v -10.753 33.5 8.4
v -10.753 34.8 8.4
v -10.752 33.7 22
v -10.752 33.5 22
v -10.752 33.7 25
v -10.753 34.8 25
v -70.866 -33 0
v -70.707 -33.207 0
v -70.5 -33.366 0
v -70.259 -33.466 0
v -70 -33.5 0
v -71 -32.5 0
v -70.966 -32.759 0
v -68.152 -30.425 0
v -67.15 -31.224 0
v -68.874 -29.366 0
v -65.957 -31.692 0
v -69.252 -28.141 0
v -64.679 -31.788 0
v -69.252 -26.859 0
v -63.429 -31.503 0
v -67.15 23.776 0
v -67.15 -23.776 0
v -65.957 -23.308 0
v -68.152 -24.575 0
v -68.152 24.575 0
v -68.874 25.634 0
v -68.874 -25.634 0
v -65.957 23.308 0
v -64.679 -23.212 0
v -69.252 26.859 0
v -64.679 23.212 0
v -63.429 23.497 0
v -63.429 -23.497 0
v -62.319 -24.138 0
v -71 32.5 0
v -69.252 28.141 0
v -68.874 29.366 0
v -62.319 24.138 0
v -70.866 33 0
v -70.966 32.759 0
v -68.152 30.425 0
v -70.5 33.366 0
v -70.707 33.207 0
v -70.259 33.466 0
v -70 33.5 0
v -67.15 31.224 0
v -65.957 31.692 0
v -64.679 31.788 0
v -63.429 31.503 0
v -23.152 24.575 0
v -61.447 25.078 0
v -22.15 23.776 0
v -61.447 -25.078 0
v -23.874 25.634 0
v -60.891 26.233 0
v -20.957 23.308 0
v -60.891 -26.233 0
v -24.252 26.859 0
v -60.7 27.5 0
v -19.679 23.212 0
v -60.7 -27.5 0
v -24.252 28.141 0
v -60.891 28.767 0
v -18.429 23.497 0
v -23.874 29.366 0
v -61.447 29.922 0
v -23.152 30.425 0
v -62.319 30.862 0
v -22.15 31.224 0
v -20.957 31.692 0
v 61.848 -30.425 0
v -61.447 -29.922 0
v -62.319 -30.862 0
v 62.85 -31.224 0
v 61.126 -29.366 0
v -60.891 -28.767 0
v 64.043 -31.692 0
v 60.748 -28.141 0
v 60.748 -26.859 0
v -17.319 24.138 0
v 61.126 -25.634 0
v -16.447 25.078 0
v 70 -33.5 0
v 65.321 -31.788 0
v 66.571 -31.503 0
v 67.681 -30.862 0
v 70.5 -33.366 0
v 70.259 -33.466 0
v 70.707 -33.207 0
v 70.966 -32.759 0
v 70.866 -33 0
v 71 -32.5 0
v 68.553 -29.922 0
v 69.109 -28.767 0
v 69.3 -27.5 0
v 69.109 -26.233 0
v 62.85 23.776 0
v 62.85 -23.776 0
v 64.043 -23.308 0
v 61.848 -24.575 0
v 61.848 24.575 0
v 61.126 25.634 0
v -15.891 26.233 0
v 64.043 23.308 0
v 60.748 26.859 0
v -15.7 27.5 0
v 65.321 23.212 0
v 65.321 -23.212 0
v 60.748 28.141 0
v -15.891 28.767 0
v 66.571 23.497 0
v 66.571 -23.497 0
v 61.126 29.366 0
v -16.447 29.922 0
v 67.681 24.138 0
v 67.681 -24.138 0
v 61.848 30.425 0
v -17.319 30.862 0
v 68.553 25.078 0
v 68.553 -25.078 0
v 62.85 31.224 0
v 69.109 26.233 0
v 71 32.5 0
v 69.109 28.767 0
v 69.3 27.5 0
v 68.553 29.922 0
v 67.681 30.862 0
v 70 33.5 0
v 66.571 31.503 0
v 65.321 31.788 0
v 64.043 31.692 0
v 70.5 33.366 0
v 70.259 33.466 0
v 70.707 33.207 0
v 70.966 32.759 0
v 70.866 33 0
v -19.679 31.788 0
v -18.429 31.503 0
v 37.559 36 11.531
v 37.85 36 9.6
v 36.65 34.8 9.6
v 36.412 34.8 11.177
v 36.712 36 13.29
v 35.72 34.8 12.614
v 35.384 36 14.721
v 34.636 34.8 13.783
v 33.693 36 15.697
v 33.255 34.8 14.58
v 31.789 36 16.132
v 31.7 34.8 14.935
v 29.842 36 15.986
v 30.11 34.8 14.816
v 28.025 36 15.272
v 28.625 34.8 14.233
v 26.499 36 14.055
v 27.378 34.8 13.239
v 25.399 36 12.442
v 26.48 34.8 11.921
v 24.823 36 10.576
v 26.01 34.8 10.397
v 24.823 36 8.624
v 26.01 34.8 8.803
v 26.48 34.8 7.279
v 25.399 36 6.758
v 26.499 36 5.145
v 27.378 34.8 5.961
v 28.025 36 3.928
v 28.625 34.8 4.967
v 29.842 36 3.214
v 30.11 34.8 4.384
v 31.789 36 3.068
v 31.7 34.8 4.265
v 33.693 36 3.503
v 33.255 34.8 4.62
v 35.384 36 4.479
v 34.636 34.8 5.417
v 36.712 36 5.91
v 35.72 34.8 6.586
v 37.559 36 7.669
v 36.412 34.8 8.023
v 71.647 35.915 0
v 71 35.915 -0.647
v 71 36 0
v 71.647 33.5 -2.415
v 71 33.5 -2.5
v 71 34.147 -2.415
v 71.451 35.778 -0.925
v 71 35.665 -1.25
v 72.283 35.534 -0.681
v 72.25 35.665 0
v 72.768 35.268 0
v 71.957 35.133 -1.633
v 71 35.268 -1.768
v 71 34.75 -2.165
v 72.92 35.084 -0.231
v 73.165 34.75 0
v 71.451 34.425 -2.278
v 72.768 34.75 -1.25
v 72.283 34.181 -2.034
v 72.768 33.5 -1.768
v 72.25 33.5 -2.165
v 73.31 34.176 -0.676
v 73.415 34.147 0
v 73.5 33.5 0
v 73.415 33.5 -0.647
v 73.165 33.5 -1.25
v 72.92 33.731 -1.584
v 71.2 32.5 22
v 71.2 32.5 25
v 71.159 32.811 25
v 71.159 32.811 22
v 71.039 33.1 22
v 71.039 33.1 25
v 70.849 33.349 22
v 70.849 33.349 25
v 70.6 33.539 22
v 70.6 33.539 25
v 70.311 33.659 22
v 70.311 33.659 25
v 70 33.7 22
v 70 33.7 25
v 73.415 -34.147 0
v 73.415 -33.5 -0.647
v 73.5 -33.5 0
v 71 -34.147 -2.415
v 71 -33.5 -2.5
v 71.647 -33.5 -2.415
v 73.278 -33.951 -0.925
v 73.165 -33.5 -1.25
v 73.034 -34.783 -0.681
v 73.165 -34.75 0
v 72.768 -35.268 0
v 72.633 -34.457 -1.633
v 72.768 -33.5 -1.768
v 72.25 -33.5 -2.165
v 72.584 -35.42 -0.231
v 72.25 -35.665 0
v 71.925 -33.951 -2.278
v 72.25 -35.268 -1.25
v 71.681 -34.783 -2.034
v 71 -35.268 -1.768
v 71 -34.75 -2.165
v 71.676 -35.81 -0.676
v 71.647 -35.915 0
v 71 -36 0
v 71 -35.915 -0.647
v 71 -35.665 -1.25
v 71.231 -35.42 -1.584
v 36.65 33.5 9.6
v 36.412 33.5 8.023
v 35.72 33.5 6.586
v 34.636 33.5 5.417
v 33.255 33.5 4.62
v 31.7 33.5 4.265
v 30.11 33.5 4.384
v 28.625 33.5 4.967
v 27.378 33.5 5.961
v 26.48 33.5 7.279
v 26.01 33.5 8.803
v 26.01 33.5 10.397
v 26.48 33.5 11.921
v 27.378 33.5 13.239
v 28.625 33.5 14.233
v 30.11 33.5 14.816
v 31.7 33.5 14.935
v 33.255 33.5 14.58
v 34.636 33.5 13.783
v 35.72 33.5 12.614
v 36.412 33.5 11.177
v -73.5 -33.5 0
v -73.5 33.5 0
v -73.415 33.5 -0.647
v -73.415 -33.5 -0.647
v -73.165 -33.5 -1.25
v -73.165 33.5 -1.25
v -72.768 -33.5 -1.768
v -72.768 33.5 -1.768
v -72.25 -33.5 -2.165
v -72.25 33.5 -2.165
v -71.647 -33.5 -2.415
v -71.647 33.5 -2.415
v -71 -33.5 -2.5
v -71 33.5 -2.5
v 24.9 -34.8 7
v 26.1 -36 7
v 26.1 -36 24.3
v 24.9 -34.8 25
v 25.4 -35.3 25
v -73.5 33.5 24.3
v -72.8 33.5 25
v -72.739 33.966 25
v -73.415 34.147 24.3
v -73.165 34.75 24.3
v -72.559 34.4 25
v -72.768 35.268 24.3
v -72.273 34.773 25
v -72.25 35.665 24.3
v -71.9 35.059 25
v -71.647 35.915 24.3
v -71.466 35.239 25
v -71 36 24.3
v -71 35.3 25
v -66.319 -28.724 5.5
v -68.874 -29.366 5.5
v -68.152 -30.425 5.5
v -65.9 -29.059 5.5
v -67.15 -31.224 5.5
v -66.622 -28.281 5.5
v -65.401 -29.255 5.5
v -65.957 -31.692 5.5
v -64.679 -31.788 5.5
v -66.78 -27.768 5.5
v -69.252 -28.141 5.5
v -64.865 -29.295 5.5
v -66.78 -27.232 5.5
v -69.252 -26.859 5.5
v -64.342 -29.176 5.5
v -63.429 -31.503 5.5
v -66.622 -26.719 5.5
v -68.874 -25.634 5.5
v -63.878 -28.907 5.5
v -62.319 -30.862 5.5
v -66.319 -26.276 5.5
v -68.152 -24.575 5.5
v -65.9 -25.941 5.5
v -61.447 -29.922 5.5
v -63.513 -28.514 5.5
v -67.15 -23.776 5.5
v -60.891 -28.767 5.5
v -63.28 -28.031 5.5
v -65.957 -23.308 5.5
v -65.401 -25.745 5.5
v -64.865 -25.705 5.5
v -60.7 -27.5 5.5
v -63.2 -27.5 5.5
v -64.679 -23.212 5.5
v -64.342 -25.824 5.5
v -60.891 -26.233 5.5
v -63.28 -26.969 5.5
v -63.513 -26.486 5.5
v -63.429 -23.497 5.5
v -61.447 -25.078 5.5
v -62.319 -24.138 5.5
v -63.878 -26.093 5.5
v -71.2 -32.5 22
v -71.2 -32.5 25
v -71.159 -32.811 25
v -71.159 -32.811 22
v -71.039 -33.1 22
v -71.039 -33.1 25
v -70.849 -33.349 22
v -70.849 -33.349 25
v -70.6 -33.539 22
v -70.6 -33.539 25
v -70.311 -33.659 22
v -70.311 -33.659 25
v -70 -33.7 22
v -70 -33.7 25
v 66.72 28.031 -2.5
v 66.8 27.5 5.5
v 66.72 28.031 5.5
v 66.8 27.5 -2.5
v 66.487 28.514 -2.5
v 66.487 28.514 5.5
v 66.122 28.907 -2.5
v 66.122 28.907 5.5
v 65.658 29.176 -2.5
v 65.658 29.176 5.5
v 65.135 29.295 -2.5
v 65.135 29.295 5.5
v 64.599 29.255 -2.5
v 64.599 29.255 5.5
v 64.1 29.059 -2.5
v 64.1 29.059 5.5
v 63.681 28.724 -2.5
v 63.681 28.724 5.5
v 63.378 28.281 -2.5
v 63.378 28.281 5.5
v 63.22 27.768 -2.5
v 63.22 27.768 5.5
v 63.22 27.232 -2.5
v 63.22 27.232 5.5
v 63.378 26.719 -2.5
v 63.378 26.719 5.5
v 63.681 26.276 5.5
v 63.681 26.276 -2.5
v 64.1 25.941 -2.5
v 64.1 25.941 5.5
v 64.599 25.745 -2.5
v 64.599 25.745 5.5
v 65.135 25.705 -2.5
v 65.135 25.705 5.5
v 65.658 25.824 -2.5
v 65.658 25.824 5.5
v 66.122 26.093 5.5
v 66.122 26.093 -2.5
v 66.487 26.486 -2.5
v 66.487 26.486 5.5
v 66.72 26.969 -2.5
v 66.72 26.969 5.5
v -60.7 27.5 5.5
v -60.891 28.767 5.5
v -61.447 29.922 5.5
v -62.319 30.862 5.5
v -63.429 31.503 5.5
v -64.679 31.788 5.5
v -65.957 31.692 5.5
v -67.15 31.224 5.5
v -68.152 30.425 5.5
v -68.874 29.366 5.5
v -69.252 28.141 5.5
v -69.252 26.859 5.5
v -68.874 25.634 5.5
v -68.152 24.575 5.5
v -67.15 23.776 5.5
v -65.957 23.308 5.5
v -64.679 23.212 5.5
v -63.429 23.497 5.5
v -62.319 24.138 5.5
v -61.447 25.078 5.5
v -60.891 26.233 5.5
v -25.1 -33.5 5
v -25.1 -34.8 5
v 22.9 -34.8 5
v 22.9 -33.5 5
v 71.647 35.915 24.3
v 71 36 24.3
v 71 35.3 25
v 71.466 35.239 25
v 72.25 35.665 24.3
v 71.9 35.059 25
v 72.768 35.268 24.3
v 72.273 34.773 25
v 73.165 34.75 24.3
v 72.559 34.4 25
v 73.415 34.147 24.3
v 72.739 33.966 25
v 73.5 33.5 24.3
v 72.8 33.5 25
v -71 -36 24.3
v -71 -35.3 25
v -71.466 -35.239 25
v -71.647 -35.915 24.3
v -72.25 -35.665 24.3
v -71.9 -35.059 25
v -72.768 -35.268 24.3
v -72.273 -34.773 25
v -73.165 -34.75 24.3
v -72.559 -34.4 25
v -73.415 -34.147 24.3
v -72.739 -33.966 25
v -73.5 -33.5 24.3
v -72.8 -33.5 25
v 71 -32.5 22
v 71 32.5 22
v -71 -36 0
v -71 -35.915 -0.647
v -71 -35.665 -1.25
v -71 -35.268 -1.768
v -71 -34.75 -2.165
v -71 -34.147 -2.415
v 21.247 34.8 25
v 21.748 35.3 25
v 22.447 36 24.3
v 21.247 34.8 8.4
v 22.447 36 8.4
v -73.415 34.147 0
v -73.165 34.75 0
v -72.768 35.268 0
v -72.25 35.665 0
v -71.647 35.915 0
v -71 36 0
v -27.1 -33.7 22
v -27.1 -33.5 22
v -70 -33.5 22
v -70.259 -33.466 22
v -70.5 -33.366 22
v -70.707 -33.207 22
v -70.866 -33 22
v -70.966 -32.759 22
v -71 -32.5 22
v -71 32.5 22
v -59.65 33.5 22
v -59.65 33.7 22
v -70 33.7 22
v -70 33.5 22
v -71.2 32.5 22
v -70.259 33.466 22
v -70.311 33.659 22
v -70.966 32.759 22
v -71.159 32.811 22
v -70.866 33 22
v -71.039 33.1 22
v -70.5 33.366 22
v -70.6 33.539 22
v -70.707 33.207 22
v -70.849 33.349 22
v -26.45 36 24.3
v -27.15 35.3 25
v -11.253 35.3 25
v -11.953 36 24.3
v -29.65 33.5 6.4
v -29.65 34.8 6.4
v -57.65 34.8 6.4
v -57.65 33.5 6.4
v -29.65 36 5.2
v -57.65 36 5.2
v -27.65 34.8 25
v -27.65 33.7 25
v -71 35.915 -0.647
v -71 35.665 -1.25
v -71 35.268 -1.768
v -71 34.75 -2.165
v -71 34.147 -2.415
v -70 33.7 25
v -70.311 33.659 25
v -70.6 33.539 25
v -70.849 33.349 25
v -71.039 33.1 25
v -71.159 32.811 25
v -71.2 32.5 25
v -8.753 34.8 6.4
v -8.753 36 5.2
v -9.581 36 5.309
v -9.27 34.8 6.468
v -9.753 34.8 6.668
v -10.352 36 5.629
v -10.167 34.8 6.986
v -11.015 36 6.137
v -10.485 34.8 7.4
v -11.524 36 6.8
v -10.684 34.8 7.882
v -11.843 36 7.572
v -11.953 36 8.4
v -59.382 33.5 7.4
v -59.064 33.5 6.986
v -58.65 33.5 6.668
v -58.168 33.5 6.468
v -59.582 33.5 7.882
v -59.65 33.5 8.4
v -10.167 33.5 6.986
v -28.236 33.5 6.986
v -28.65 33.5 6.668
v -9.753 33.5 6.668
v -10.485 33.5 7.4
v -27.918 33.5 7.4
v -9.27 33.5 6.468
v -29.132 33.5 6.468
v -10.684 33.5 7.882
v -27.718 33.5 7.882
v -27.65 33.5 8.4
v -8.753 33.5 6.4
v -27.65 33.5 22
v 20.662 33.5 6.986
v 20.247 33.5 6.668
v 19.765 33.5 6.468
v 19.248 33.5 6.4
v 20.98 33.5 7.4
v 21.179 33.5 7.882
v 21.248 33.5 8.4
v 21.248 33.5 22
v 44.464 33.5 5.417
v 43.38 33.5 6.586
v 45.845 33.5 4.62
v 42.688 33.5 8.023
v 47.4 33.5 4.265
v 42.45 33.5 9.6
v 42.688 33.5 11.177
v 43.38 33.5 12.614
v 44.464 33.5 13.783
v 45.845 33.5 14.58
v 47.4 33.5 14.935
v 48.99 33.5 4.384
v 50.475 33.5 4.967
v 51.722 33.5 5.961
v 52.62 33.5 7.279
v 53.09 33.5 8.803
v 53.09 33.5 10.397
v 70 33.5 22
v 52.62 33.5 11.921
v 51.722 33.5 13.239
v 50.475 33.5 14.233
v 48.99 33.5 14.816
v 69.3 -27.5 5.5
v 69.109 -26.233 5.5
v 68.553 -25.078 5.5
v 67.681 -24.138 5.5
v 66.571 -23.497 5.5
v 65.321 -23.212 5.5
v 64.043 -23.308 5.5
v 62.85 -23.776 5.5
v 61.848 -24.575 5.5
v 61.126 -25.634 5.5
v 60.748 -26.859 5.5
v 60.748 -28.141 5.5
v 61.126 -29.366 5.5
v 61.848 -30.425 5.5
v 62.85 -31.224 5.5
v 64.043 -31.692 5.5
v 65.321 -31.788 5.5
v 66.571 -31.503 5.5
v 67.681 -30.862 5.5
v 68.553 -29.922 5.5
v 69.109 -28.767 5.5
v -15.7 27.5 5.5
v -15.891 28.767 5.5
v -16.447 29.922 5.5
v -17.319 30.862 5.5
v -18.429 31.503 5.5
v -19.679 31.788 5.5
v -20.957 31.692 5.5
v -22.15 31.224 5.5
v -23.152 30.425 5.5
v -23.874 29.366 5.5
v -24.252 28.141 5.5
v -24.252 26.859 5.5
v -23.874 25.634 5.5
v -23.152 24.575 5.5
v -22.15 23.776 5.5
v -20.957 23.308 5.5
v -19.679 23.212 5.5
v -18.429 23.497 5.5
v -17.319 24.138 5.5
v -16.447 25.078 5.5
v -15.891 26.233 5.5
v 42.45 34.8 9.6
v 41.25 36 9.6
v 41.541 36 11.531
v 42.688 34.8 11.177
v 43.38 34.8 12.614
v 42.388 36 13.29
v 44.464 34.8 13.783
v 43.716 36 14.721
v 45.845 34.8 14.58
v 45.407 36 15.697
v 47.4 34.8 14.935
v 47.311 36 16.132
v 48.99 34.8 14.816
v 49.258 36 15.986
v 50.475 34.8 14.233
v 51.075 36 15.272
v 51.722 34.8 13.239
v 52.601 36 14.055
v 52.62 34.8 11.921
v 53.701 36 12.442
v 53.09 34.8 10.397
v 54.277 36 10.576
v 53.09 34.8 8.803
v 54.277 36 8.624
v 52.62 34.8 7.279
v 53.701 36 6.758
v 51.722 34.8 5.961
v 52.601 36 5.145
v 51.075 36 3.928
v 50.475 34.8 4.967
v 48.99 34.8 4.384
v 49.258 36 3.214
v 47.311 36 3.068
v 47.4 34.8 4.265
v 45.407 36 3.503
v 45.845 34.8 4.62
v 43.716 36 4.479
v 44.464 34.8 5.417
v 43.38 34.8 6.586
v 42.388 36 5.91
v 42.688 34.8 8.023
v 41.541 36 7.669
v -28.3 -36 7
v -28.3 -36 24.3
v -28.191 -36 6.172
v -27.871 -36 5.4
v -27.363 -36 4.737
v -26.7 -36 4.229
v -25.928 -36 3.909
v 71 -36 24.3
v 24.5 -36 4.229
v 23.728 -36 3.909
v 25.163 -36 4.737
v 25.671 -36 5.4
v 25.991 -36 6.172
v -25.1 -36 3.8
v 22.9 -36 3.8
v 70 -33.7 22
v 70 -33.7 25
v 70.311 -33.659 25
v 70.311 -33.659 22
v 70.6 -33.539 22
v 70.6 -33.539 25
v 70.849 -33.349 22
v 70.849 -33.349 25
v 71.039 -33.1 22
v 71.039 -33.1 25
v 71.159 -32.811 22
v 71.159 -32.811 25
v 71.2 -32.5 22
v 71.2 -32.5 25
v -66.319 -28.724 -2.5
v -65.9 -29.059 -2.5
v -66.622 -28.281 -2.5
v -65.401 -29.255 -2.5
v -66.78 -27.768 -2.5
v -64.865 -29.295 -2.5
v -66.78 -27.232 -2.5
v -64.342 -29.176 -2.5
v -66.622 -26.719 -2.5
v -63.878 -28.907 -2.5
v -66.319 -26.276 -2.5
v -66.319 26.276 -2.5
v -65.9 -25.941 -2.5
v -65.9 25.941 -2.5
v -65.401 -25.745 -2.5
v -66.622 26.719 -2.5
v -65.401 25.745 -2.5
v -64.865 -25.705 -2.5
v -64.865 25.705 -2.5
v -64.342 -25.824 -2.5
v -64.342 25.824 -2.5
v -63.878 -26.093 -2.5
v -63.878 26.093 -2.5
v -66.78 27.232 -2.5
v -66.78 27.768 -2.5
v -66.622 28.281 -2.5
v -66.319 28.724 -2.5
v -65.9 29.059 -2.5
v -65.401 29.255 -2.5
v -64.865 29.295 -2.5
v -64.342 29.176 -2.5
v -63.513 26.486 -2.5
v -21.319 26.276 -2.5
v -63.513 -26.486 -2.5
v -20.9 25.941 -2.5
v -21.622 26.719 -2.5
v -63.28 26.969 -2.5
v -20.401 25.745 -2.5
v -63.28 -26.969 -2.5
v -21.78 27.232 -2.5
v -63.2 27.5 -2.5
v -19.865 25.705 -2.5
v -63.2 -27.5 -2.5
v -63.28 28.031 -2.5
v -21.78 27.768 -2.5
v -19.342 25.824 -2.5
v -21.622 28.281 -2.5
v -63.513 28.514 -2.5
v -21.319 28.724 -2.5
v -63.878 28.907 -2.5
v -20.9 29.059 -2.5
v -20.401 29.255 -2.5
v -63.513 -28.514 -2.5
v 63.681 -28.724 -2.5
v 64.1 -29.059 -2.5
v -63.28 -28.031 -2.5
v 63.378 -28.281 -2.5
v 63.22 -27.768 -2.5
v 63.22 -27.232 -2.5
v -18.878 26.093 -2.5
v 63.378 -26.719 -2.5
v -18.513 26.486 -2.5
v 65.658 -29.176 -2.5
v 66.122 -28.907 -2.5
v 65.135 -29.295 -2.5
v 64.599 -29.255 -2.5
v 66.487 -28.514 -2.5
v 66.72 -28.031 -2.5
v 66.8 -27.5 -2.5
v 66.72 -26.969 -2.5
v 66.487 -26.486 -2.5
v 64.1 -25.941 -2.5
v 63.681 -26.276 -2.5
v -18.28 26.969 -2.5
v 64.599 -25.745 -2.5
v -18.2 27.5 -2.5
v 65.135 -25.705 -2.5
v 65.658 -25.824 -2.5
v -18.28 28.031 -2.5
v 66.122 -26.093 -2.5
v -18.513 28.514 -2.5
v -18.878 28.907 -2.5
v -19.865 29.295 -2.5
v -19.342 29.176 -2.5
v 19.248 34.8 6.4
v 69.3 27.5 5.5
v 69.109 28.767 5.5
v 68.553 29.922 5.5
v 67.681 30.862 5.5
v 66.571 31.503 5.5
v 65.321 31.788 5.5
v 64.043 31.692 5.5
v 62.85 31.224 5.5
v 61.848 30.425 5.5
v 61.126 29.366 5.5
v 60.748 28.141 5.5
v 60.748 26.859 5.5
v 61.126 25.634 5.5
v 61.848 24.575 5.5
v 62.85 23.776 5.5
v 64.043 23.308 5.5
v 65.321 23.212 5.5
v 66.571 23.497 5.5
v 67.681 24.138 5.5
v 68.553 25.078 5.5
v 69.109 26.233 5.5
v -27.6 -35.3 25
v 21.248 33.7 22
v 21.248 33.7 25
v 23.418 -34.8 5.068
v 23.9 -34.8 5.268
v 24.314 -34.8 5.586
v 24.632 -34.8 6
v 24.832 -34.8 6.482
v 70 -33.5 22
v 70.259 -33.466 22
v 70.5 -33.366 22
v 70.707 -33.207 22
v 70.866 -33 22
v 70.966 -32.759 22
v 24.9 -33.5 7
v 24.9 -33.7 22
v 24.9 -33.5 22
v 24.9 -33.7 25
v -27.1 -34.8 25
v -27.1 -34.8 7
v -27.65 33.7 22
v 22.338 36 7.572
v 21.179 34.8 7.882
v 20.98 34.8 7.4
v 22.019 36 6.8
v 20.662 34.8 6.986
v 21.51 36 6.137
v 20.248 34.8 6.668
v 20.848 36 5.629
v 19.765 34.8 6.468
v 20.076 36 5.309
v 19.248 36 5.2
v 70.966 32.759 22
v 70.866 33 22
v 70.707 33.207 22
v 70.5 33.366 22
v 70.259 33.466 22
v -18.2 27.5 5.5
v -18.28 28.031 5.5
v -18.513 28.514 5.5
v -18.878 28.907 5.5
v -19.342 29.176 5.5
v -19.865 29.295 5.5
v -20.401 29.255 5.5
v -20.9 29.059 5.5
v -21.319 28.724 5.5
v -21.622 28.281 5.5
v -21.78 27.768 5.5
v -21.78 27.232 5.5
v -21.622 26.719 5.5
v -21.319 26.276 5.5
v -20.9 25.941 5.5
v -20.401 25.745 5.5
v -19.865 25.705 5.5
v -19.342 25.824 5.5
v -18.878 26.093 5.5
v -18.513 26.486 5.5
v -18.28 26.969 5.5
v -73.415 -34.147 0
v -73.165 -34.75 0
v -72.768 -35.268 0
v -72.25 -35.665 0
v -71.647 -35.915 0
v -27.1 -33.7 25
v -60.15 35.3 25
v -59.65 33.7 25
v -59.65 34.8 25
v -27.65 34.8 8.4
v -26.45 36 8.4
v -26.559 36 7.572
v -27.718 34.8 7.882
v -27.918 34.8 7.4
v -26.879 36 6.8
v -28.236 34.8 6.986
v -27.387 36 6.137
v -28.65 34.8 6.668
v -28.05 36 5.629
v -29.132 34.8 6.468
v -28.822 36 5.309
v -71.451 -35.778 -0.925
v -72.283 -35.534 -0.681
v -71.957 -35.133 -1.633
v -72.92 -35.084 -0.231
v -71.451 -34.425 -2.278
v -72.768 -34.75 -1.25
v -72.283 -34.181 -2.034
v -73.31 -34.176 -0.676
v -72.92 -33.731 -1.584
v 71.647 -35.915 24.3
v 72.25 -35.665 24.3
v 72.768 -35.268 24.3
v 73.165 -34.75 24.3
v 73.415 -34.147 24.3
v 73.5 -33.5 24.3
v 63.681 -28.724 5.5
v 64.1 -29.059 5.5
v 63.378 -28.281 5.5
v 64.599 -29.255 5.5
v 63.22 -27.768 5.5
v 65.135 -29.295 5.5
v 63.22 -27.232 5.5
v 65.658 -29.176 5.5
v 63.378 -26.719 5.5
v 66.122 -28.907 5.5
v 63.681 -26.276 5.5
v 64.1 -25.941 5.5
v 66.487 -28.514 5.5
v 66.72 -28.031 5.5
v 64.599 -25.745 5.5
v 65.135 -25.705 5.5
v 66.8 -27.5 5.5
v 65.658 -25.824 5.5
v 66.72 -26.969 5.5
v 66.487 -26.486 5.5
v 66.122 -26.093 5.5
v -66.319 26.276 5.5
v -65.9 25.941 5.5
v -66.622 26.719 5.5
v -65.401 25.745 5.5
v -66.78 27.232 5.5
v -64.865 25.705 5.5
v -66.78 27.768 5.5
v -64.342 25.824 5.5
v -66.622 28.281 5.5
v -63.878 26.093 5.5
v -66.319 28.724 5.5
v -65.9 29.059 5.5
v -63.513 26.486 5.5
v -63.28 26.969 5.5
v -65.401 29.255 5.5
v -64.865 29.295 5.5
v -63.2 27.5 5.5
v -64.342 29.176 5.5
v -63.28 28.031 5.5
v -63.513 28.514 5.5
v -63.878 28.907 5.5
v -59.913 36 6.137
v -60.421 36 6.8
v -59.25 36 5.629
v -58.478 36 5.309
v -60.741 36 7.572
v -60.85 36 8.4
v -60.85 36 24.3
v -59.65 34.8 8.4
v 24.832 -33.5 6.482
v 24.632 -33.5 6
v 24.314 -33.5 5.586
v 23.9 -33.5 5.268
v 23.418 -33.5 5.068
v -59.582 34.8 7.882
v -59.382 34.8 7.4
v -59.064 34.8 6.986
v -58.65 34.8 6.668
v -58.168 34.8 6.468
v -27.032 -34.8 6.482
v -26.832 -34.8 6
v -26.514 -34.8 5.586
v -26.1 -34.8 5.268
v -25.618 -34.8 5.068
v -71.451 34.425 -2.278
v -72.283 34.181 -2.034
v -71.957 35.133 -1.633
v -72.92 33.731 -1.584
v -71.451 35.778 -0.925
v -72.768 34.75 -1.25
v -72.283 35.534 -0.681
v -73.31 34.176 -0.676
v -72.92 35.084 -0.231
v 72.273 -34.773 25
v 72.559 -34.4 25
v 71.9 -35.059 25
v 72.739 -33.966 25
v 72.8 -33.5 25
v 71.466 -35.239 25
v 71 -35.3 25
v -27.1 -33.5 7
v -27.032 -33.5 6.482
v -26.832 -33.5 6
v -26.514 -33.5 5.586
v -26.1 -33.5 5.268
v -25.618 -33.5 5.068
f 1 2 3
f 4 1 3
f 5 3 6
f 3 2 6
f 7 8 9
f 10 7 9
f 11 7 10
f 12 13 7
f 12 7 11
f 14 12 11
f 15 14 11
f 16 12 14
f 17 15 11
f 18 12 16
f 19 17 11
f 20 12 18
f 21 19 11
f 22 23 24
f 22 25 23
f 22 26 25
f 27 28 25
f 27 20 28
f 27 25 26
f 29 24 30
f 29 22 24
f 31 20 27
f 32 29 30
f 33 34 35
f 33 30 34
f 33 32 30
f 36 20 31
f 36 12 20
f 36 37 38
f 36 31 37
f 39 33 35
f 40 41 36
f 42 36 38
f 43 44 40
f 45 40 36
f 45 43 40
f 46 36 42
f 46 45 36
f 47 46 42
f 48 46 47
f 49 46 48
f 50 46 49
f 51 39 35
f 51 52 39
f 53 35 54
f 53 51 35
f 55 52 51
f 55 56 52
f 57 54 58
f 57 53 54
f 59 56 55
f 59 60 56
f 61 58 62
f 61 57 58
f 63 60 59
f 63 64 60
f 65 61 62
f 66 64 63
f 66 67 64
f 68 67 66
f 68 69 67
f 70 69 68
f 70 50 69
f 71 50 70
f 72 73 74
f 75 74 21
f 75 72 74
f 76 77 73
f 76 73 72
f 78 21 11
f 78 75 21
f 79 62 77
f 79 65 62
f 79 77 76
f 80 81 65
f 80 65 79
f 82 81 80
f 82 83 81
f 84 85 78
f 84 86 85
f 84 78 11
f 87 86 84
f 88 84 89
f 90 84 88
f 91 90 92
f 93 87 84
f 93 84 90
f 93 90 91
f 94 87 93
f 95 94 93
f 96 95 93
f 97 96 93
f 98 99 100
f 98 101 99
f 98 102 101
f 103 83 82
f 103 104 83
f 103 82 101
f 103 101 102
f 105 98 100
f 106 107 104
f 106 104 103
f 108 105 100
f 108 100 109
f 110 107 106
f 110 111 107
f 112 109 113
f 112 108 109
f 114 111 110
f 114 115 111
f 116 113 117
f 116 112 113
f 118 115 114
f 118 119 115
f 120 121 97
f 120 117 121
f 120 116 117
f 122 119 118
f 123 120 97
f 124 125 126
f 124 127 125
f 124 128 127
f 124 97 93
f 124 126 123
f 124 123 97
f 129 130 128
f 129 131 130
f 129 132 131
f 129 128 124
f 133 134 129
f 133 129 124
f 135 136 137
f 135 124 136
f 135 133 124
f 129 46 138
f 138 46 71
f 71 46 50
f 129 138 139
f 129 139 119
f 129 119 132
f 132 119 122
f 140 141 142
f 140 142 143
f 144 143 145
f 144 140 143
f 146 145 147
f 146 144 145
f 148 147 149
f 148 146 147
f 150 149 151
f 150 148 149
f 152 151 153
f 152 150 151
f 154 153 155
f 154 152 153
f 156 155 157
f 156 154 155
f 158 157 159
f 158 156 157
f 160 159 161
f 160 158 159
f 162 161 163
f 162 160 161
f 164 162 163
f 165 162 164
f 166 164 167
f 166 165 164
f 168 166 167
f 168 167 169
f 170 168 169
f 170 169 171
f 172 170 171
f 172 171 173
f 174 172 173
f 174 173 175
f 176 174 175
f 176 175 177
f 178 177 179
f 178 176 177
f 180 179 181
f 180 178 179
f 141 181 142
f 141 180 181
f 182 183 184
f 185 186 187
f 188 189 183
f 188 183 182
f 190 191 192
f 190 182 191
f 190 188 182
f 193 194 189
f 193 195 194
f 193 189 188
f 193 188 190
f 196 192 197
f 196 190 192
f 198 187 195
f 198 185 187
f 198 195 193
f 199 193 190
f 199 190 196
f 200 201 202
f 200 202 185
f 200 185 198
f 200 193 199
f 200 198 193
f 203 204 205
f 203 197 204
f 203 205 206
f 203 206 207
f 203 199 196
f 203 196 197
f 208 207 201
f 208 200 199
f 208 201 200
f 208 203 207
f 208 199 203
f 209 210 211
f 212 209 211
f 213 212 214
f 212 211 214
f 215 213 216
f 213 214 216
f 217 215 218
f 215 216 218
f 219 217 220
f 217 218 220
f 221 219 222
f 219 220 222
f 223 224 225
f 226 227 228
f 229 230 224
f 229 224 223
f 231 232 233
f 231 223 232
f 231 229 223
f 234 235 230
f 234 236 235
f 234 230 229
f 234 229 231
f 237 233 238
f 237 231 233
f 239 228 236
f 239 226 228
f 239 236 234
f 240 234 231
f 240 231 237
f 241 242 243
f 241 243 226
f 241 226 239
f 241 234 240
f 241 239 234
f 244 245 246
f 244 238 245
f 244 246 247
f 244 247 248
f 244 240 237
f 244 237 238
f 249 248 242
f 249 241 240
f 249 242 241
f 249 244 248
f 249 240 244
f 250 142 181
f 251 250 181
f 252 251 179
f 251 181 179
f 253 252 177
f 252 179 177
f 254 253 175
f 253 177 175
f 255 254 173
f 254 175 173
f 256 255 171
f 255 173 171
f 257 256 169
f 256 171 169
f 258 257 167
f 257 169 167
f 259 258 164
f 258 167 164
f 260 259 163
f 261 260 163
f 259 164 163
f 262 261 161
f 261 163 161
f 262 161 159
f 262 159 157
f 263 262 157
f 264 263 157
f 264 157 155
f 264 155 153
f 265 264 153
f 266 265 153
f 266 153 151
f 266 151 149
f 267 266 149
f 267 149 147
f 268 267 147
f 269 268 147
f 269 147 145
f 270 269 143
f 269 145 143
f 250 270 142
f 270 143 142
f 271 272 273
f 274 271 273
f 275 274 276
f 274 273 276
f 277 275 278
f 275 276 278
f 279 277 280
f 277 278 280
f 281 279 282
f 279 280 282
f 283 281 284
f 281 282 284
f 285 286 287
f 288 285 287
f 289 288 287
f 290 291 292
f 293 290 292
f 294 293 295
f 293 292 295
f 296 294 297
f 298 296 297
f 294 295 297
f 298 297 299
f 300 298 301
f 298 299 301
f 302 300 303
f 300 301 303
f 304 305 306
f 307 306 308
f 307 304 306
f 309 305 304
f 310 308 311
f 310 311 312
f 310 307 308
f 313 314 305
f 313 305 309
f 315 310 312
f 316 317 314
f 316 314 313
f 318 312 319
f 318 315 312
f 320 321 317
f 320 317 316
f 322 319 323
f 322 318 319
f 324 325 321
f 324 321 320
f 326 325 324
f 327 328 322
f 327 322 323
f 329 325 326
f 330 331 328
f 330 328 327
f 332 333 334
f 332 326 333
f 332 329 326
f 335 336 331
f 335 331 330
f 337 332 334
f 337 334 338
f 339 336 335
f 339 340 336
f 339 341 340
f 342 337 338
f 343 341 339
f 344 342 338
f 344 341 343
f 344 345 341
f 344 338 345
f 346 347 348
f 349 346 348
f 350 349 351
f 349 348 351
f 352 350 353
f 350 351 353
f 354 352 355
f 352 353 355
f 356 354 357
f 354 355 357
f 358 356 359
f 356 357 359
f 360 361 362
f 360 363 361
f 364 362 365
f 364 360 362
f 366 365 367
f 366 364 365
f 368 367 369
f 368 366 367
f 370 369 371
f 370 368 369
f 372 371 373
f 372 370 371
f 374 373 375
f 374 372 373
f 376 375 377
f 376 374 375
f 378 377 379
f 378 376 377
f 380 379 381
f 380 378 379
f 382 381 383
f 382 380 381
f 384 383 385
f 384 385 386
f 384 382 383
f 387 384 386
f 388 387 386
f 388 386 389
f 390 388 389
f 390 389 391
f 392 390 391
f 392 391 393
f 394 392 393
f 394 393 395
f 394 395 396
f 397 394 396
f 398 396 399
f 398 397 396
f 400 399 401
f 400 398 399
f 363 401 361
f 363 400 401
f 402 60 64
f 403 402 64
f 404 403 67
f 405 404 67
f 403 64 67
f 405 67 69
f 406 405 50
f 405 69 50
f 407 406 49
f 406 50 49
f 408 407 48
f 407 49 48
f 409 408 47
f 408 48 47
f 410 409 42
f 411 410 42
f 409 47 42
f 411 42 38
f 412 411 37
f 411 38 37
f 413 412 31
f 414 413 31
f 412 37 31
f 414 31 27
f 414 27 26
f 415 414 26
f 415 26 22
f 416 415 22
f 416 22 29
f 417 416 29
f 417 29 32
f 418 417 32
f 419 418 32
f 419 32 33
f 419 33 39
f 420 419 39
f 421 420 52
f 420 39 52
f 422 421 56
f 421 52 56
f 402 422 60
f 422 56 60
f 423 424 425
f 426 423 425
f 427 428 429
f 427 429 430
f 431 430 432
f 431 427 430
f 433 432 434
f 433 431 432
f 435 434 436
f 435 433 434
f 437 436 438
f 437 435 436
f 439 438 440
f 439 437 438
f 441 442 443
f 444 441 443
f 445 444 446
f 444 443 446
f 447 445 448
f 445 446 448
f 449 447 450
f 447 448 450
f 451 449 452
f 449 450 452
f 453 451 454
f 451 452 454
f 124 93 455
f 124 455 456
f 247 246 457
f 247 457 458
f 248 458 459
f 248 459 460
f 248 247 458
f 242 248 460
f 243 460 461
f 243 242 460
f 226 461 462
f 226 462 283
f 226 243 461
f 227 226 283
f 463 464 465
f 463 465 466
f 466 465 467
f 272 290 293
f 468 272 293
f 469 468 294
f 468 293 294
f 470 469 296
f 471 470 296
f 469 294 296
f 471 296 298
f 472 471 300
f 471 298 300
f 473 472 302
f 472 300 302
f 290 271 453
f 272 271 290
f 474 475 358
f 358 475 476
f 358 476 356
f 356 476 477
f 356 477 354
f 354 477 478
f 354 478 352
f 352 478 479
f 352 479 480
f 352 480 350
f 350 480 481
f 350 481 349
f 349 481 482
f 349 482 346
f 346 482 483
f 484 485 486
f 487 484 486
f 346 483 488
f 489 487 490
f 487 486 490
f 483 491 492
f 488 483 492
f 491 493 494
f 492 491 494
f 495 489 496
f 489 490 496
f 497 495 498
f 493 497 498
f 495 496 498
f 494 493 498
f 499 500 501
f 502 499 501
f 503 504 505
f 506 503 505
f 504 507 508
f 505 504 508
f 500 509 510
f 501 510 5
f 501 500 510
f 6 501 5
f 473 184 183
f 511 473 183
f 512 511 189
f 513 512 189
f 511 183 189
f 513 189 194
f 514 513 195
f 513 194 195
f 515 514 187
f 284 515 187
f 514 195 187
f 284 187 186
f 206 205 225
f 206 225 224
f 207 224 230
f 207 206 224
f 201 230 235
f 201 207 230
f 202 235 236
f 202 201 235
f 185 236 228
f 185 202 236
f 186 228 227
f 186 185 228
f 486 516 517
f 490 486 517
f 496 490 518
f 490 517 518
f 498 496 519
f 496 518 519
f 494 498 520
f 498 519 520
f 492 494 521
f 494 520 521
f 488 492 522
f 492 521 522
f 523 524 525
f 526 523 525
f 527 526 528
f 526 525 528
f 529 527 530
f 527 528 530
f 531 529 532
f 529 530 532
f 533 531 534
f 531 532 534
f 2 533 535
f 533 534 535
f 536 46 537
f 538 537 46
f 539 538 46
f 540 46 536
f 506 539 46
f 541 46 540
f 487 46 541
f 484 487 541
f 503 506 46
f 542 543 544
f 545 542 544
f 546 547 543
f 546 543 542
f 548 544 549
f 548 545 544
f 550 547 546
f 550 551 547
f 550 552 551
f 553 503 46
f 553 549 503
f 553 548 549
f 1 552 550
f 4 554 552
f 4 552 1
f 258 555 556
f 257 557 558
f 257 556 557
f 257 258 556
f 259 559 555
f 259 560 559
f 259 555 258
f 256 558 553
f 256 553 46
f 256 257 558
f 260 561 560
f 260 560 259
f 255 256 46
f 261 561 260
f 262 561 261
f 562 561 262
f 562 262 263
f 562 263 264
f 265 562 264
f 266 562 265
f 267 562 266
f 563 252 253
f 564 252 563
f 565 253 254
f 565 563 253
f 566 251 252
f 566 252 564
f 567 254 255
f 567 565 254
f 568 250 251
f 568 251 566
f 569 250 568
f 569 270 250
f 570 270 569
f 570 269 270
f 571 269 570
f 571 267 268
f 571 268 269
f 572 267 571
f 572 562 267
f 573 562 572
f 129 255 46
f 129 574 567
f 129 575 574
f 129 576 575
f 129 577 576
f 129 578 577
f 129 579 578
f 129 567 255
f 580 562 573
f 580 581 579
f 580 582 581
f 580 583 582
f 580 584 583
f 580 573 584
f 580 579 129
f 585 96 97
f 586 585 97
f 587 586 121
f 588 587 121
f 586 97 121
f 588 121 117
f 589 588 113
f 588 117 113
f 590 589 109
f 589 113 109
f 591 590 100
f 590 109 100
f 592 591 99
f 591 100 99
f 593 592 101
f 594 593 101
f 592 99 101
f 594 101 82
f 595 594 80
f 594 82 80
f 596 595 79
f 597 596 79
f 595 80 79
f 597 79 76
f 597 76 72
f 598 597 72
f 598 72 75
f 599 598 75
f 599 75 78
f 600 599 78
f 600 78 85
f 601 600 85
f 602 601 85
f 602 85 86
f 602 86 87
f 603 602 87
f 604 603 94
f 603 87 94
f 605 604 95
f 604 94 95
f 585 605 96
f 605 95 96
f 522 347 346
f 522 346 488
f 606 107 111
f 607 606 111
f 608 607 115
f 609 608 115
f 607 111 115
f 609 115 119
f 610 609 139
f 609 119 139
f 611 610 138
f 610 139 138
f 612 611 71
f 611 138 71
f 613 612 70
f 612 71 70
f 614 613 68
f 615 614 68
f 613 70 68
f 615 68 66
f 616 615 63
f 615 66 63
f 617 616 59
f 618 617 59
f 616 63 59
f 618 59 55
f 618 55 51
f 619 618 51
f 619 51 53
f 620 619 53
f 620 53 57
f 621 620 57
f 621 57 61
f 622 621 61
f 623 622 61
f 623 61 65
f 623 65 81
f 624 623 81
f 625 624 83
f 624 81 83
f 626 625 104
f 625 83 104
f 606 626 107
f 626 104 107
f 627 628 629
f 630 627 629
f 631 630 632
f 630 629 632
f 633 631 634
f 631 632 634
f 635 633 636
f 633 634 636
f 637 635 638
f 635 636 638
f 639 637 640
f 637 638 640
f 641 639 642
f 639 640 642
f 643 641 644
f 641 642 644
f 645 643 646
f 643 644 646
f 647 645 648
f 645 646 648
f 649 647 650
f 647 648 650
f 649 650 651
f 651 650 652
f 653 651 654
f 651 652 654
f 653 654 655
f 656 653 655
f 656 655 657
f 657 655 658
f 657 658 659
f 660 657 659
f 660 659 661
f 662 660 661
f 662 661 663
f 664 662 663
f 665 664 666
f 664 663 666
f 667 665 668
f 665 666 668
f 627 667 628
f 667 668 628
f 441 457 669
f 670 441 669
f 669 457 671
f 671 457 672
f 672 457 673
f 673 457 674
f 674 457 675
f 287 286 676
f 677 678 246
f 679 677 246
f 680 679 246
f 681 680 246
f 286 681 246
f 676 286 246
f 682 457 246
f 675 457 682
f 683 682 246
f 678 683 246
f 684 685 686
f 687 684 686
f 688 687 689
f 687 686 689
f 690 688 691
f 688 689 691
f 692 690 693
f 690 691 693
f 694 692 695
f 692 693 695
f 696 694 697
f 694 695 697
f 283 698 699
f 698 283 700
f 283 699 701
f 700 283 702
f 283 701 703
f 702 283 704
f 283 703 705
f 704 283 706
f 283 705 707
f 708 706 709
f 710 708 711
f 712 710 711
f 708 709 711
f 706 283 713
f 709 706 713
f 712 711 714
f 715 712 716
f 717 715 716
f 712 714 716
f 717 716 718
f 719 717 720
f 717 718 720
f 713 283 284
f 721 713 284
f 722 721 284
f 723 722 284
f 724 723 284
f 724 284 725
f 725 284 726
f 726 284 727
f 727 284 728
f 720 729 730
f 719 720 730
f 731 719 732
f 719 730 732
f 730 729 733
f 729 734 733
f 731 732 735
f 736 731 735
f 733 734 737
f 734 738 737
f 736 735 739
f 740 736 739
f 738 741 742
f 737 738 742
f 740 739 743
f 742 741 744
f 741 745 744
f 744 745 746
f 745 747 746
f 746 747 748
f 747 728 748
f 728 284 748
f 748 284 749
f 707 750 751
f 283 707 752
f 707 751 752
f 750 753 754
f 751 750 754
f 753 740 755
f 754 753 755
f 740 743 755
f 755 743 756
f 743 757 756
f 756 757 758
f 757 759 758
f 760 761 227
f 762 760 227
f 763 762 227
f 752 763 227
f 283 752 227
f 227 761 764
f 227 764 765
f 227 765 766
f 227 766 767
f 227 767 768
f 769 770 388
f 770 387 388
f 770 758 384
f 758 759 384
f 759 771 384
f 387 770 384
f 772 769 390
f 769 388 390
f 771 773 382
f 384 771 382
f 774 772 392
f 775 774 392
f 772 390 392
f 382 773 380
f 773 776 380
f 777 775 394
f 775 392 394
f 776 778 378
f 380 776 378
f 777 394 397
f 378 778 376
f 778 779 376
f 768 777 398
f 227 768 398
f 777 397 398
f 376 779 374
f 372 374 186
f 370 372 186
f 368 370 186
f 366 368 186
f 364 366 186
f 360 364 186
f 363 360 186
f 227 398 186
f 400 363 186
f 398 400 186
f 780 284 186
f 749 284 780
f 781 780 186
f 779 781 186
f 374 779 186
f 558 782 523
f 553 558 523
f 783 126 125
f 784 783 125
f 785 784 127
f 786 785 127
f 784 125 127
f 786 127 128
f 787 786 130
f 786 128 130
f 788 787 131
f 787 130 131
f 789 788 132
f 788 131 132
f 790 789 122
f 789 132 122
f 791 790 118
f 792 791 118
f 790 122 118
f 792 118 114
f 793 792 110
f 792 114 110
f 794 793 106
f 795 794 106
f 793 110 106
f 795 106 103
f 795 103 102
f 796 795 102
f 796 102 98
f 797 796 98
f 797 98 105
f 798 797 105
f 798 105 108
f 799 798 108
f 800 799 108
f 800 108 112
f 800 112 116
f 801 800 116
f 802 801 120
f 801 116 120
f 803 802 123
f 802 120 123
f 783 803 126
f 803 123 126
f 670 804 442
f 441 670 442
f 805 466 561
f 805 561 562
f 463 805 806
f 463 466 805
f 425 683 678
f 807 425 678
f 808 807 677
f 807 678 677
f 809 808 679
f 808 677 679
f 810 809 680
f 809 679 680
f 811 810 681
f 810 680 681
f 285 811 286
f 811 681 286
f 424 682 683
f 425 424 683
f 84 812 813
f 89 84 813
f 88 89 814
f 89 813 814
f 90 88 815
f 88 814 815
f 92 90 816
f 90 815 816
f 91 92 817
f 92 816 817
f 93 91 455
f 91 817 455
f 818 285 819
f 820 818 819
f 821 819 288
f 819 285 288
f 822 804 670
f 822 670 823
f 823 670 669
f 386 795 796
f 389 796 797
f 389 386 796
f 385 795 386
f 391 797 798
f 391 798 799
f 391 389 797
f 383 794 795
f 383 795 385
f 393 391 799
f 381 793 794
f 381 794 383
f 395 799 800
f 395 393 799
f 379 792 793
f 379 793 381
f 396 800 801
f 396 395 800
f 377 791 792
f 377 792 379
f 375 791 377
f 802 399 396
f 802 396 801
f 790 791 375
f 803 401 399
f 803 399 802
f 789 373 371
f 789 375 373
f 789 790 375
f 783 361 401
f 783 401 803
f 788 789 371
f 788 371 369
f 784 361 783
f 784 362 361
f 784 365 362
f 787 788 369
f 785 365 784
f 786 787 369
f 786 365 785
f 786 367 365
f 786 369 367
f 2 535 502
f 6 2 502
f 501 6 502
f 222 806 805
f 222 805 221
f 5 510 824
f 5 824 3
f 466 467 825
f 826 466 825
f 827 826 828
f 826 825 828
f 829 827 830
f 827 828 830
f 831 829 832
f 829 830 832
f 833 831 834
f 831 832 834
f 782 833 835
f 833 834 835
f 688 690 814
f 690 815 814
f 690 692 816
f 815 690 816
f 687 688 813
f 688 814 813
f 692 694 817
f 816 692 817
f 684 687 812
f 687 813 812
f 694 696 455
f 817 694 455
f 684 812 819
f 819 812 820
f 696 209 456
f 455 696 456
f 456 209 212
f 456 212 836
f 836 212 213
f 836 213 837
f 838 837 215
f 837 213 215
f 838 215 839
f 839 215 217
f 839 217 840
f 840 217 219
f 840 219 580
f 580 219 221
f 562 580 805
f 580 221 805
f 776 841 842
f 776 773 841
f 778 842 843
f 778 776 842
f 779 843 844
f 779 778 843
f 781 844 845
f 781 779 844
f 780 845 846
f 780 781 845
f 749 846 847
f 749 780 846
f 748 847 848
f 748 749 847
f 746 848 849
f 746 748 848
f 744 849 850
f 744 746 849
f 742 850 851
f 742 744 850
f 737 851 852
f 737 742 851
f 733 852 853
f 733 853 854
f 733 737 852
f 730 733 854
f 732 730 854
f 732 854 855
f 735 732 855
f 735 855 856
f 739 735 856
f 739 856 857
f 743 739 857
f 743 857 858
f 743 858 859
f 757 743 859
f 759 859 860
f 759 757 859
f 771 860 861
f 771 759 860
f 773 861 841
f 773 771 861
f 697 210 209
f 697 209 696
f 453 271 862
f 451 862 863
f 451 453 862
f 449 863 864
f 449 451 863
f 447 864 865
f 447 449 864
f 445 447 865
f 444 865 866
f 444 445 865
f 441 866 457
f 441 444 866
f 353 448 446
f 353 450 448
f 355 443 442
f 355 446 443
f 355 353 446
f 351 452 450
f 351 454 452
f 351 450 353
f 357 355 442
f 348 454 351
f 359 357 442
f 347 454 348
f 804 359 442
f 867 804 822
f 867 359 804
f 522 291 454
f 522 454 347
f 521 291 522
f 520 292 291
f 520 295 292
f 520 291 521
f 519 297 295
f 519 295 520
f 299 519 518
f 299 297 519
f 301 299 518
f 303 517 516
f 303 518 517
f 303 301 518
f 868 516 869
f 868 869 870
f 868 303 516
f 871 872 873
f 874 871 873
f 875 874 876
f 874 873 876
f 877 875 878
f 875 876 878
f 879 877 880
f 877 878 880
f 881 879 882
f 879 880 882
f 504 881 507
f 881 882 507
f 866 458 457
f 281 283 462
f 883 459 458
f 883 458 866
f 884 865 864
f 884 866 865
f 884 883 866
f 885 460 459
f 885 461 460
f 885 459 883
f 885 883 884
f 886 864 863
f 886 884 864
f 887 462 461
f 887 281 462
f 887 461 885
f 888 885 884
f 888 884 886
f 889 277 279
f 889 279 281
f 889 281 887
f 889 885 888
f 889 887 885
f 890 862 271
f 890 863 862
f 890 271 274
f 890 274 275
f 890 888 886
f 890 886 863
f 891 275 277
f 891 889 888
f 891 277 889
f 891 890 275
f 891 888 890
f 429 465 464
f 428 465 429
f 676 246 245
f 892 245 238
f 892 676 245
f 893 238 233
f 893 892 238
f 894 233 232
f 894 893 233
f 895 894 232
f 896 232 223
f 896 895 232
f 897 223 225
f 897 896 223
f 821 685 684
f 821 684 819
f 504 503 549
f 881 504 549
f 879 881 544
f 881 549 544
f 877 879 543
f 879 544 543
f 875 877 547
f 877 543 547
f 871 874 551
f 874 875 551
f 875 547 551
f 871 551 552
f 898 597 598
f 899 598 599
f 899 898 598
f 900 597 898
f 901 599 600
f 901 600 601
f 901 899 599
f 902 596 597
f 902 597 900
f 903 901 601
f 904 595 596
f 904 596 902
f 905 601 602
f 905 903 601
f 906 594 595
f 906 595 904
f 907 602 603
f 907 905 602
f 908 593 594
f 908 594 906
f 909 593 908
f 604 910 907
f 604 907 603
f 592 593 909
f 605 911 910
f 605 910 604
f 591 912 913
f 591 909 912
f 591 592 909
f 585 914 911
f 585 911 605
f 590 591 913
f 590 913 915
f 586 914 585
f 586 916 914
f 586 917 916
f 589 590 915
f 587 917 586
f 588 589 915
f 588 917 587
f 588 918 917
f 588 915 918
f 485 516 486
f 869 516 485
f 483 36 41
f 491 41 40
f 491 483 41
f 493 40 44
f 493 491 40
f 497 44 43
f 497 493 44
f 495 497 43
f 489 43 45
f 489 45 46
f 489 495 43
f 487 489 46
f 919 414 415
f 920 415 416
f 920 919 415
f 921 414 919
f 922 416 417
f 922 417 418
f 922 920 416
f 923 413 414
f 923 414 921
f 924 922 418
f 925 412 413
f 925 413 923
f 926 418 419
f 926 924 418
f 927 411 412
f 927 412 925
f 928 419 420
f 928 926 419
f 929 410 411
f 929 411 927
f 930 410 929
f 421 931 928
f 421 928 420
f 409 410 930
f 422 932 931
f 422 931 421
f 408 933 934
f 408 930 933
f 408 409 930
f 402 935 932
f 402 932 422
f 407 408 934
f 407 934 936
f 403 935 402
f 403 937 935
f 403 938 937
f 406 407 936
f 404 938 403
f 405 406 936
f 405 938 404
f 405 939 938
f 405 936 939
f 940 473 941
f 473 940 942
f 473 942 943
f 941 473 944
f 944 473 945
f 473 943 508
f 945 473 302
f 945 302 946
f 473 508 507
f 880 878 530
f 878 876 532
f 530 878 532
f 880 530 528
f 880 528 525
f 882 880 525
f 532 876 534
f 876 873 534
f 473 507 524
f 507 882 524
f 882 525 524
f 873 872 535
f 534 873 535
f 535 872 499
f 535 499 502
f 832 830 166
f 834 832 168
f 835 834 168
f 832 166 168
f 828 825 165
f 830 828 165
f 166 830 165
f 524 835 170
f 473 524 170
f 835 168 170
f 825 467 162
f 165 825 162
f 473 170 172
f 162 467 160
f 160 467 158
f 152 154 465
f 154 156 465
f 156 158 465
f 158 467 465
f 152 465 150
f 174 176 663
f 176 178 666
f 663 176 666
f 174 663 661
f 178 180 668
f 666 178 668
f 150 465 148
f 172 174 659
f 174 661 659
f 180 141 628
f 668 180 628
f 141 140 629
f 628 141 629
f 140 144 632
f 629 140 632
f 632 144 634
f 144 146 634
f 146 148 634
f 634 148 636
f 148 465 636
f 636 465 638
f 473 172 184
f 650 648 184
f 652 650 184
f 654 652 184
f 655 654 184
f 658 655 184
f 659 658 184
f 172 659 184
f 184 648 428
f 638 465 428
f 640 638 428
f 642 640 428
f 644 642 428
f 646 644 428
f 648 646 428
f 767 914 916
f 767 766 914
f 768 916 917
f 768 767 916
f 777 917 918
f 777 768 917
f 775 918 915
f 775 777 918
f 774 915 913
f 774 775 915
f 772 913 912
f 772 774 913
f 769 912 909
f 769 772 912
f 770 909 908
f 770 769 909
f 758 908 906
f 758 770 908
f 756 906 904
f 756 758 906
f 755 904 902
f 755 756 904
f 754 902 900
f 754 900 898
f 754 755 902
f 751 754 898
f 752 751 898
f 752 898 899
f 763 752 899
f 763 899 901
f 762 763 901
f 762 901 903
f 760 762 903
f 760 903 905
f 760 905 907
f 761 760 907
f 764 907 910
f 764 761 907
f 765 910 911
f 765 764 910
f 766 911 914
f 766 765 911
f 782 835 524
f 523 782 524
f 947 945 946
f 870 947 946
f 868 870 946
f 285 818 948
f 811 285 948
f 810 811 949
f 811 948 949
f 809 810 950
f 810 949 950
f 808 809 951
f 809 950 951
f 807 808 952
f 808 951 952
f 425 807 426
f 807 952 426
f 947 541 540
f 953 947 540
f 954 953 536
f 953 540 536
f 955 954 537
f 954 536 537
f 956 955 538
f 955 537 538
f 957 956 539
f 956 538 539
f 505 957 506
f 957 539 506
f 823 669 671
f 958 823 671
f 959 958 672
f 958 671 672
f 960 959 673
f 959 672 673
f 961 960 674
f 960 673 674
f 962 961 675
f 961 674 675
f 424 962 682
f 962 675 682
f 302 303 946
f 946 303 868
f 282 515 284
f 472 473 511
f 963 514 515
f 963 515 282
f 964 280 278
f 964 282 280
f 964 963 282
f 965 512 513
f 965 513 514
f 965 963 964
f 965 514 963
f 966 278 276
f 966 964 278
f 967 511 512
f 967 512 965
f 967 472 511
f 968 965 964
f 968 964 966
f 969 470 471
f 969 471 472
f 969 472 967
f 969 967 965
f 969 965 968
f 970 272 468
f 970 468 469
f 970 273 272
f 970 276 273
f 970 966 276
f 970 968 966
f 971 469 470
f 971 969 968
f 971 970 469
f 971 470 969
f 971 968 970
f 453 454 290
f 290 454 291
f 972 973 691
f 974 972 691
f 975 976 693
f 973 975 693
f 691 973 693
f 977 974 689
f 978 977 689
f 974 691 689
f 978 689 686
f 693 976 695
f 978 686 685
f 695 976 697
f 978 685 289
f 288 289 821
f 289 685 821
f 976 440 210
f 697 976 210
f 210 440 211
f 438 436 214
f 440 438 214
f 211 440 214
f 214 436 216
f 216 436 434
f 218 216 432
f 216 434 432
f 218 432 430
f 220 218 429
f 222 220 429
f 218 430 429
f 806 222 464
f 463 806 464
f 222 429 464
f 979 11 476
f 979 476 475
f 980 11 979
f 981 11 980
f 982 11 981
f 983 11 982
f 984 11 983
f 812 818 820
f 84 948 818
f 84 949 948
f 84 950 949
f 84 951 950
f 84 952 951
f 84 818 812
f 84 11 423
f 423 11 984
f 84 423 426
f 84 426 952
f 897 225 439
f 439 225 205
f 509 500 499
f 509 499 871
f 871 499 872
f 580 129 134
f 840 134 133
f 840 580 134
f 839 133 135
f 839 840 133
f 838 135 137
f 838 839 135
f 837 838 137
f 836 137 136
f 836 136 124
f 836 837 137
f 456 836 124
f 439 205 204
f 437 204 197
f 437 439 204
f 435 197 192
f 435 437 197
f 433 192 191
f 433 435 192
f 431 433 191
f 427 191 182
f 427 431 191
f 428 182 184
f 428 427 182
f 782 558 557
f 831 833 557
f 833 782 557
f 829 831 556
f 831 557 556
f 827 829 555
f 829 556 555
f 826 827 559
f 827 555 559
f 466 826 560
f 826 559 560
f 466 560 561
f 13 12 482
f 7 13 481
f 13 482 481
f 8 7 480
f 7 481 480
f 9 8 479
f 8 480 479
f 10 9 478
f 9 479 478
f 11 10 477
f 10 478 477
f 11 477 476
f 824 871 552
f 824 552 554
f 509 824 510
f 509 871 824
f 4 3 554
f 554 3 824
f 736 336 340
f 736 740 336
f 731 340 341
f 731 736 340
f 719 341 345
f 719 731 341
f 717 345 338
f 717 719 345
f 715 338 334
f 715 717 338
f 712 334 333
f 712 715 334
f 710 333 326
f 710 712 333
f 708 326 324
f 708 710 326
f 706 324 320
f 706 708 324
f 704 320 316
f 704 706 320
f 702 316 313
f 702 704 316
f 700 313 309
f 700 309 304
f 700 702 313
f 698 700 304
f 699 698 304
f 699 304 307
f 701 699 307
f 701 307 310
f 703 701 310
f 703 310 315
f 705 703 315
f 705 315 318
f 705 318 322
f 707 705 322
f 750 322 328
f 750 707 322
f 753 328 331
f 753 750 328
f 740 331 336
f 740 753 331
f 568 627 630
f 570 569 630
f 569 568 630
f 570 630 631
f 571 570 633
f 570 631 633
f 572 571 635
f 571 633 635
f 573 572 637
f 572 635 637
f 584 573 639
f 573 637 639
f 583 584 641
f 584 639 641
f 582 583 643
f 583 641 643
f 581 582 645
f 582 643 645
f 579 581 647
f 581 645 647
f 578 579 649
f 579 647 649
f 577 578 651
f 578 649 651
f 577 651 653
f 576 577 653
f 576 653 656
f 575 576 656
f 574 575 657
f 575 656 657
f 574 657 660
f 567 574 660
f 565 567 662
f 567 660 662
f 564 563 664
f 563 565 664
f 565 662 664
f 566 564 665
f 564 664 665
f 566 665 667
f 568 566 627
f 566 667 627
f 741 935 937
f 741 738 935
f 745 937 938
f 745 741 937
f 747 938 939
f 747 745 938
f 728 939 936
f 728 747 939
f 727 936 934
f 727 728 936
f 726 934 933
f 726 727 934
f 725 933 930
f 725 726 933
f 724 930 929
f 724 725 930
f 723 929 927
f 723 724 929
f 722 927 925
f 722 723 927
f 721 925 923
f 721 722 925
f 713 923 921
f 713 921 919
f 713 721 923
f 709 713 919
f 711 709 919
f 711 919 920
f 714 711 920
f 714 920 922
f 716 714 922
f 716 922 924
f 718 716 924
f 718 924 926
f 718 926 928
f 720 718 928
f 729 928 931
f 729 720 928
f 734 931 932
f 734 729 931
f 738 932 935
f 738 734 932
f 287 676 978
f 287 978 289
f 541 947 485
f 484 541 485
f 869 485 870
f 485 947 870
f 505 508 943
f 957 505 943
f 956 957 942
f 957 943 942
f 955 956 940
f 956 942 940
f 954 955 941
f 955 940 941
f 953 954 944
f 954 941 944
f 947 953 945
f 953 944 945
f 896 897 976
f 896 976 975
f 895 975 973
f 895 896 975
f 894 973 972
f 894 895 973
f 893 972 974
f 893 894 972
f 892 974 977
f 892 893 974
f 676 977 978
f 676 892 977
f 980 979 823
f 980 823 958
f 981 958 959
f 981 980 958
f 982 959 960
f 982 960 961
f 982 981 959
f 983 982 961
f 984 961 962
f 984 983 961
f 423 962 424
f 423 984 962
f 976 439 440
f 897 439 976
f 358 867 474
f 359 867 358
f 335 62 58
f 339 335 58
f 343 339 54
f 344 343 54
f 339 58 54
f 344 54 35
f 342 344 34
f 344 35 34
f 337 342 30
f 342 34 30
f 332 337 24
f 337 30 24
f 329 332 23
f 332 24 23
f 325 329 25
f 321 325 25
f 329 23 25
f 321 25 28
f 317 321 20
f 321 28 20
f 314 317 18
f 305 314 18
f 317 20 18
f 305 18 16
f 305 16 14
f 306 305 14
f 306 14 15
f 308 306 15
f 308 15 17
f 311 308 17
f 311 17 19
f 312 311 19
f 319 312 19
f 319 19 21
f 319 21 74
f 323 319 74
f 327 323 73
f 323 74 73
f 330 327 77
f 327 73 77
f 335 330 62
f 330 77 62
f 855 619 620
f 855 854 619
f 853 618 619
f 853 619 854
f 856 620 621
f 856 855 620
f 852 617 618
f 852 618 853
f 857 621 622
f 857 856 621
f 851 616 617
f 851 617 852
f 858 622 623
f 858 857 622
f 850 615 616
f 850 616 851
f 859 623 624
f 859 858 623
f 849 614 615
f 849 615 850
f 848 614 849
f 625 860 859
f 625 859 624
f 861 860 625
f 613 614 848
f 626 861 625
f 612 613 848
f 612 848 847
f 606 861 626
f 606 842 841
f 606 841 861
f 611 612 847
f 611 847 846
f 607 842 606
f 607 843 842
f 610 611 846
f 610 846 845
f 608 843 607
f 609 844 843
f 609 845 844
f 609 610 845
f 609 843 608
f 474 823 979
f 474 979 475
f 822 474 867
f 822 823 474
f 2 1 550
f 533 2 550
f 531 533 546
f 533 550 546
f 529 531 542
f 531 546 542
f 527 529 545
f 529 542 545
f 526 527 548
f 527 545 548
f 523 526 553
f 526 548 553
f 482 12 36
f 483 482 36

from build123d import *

# Parameters (mm, degrees)
SKETCH_W        = 142
SKETCH_H        = 67
PAD_DEPTH       = 25
THICKNESS_T     = 2.5
SKETCH001_R     = 4.3
SKETCH001_R_2   = 1.8
PAD001_DEPTH    = 5.5
FILLET_R        = 1
SKETCH002_W     = 32
SKETCH002_H     = 18.6
POCKET_DEPTH    = 5
SKETCH003_W     = 52
SKETCH003_H     = 20
POCKET001_DEPTH = 2.5
SKETCH006_R     = 1.8
POCKET002_DEPTH = 27.501
PAD005_DEPTH    = 2.5
FILLET001_R     = 2
CHAMFER001_SIZE = 1.2
FILLET002_R     = 2
CHAMFER002_SIZE = 1.2
POCKET003_DEPTH = 3
CHAMFER003_SIZE = 0.7


with BuildPart() as part:
    # Sketch → Pad (new body)
    with BuildSketch(Plane.XY):
        Rectangle(SKETCH_W, SKETCH_H)
    extrude(amount=PAD_DEPTH)

    # Thickness
    thickness_openings = [part.faces().sort_by_distance(p)[0] for p in [
        (0, 0, 25),
    ]]
    offset(amount=THICKNESS_T, openings=thickness_openings)

    # Sketch001 (on Face5 of Thickness) → Pad001 (join)
    with BuildSketch(Plane.XY):
        with Locations((-65, -27.5)):
            Circle(SKETCH001_R)
        with Locations((-65, -27.5)):
            Circle(SKETCH001_R_2, mode=Mode.SUBTRACT)
        with Locations((-65, 27.5)):
            Circle(SKETCH001_R)
        with Locations((-65, 27.5)):
            Circle(SKETCH001_R_2, mode=Mode.SUBTRACT)
        with Locations((-20, 27.5)):
            Circle(SKETCH001_R)
        with Locations((-20, 27.5)):
            Circle(SKETCH001_R_2, mode=Mode.SUBTRACT)
        with Locations((65, 27.5)):
            Circle(SKETCH001_R)
        with Locations((65, 27.5)):
            Circle(SKETCH001_R_2, mode=Mode.SUBTRACT)
        with Locations((65, -27.5)):
            Circle(SKETCH001_R)
        with Locations((65, -27.5)):
            Circle(SKETCH001_R_2, mode=Mode.SUBTRACT)
    extrude(amount=PAD001_DEPTH)

    # Fillet
    fillet_edges = [part.edges().sort_by_distance(p)[0] for p in [
        (-71, 33.5, 12.5),
        (71, 33.5, 12.5),
        (-71, -33.5, 12.5),
        (71, -33.5, 12.5),
    ]]
    fillet(fillet_edges, radius=FILLET_R)

    # Sketch002 (on Face19 of Fillet) → Pocket (cut)
    with BuildSketch(Plane(origin=(0, 36, 0), x_dir=(-1, 0, 0), z_dir=(0, 1, 0))):
        with Locations((-5.2475, 15.7)):
            Rectangle(SKETCH002_W, SKETCH002_H)
        with Locations((43.65, 15.7)):
            Rectangle(SKETCH002_W, SKETCH002_H)
        with BuildLine():
            ThreePointArc((-42.45, 25), (-47.8, 30.35), (-53.15, 25))
            Line((-53.15, 25), (-53.15, 9.6))
            ThreePointArc((-53.15, 9.6), (-47.8, 4.25), (-42.45, 9.6))
            Line((-42.45, 25), (-42.45, 9.6))
        make_face()
        with BuildLine():
            ThreePointArc((-25.95, 25), (-31.3, 30.35), (-36.65, 25))
            Line((-36.65, 25), (-36.65, 9.6))
            ThreePointArc((-36.65, 9.6), (-31.3, 4.25), (-25.95, 9.6))
            Line((-25.95, 25), (-25.95, 9.6))
        make_face()
    extrude(amount=-POCKET_DEPTH, mode=Mode.SUBTRACT)

    # Sketch003 (on Face35 of Pocket) → Pocket001 (cut)
    with BuildSketch(Plane.XZ.offset(36)):
        with Locations((-1.1, 15)):
            Rectangle(SKETCH003_W, SKETCH003_H)
    extrude(amount=-POCKET001_DEPTH, mode=Mode.SUBTRACT)

    # Sketch006 (on Face61 of Pocket001) → Pocket002 (cut, through all)
    with BuildSketch(Plane(origin=(0, 0, -2.5), x_dir=(1, 0, 0), z_dir=(0, 0, -1))):
        with Locations((-65, 27.5)):
            Circle(SKETCH006_R)
        with Locations((65, 27.5)):
            Circle(SKETCH006_R)
        with Locations((65, -27.5)):
            Circle(SKETCH006_R)
        with Locations((-20, -27.5)):
            Circle(SKETCH006_R)
        with Locations((-65, -27.5)):
            Circle(SKETCH006_R)
    extrude(amount=-POCKET002_DEPTH, mode=Mode.SUBTRACT)

    # Sketch008 (on Face32 of Pocket002) → Pad005 (join)
    with BuildSketch(Plane(origin=(0, 36, 0), x_dir=(-1, 0, 0), z_dir=(0, 1, 0))):
        with BuildLine():
            ThreePointArc((-42.45, 9.6), (-47.8, 14.95), (-53.15, 9.6))
            Line((-53.15, 9.6), (-53.15, 25))
            Line((-53.15, 25), (-42.45, 25))
            Line((-42.45, 25), (-42.45, 9.6))
        make_face()
        with BuildLine():
            ThreePointArc((-25.95, 9.6), (-31.3, 14.95), (-36.65, 9.6))
            Line((-36.65, 9.6), (-36.65, 25))
            Line((-36.65, 25), (-25.95, 25))
            Line((-25.95, 25), (-25.95, 9.6))
        make_face()
    extrude(amount=-PAD005_DEPTH)

    # Fillet001
    fillet001_edges = [part.edges().sort_by_distance(p)[0] for p in [
        (21.2475, 34.75, 6.4),
        (-10.7525, 34.75, 6.4),
        (-27.65, 34.75, 6.4),
        (-59.65, 34.75, 6.4),
    ]]
    fillet(fillet001_edges, radius=FILLET001_R)

    # Chamfer001
    chamfer001_edges = [part.edges().sort_by_distance(p)[0] for p in [
        (31.3, 36, 4.25),
        (47.8, 36, 4.25),
        (5.2475, 36, 6.4),
        (-43.65, 36, 6.4),
    ]]
    chamfer(chamfer001_edges, length=CHAMFER001_SIZE)

    # Fillet002
    fillet002_edges = [part.edges().sort_by_distance(p)[0] for p in [
        (24.9, -34.75, 5),
        (-27.1, -34.75, 5),
    ]]
    fillet(fillet002_edges, radius=FILLET002_R)

    # Chamfer002
    chamfer002_edges = [part.edges().sort_by_distance(p)[0] for p in [
        (-1.1, -36, 5),
    ]]
    chamfer(chamfer002_edges, length=CHAMFER002_SIZE)

    # Sketch010 (on Face14 of Chamfer002) → Pocket003 (cut)
    with BuildSketch(Plane.XY.offset(25)):
        with BuildLine():
            Line((-70, 33.7), (70, 33.7))
            ThreePointArc((71.2, 32.5), (70.848528, 33.348528), (70, 33.7))
            Line((71.2, 32.5), (71.2, -32.5))
            ThreePointArc((70, -33.7), (70.848528, -33.348528), (71.2, -32.5))
            Line((70, -33.7), (-70, -33.7))
            ThreePointArc((-71.2, -32.5), (-70.848528, -33.348528), (-70, -33.7))
            Line((-71.2, -32.5), (-71.2, 32.5))
            ThreePointArc((-70, 33.7), (-70.848528, 33.348528), (-71.2, 32.5))
        make_face()
    extrude(amount=-POCKET003_DEPTH, mode=Mode.SUBTRACT)

    # Chamfer003
    chamfer003_edges = [part.edges().sort_by_distance(p)[0] for p in [
        (-65.925, 36, 25),
        (-19.20125, 36, 25),
        (31.3, 36, 25),
    ]]
    chamfer(chamfer003_edges, length=CHAMFER003_SIZE)


solid = part.part
